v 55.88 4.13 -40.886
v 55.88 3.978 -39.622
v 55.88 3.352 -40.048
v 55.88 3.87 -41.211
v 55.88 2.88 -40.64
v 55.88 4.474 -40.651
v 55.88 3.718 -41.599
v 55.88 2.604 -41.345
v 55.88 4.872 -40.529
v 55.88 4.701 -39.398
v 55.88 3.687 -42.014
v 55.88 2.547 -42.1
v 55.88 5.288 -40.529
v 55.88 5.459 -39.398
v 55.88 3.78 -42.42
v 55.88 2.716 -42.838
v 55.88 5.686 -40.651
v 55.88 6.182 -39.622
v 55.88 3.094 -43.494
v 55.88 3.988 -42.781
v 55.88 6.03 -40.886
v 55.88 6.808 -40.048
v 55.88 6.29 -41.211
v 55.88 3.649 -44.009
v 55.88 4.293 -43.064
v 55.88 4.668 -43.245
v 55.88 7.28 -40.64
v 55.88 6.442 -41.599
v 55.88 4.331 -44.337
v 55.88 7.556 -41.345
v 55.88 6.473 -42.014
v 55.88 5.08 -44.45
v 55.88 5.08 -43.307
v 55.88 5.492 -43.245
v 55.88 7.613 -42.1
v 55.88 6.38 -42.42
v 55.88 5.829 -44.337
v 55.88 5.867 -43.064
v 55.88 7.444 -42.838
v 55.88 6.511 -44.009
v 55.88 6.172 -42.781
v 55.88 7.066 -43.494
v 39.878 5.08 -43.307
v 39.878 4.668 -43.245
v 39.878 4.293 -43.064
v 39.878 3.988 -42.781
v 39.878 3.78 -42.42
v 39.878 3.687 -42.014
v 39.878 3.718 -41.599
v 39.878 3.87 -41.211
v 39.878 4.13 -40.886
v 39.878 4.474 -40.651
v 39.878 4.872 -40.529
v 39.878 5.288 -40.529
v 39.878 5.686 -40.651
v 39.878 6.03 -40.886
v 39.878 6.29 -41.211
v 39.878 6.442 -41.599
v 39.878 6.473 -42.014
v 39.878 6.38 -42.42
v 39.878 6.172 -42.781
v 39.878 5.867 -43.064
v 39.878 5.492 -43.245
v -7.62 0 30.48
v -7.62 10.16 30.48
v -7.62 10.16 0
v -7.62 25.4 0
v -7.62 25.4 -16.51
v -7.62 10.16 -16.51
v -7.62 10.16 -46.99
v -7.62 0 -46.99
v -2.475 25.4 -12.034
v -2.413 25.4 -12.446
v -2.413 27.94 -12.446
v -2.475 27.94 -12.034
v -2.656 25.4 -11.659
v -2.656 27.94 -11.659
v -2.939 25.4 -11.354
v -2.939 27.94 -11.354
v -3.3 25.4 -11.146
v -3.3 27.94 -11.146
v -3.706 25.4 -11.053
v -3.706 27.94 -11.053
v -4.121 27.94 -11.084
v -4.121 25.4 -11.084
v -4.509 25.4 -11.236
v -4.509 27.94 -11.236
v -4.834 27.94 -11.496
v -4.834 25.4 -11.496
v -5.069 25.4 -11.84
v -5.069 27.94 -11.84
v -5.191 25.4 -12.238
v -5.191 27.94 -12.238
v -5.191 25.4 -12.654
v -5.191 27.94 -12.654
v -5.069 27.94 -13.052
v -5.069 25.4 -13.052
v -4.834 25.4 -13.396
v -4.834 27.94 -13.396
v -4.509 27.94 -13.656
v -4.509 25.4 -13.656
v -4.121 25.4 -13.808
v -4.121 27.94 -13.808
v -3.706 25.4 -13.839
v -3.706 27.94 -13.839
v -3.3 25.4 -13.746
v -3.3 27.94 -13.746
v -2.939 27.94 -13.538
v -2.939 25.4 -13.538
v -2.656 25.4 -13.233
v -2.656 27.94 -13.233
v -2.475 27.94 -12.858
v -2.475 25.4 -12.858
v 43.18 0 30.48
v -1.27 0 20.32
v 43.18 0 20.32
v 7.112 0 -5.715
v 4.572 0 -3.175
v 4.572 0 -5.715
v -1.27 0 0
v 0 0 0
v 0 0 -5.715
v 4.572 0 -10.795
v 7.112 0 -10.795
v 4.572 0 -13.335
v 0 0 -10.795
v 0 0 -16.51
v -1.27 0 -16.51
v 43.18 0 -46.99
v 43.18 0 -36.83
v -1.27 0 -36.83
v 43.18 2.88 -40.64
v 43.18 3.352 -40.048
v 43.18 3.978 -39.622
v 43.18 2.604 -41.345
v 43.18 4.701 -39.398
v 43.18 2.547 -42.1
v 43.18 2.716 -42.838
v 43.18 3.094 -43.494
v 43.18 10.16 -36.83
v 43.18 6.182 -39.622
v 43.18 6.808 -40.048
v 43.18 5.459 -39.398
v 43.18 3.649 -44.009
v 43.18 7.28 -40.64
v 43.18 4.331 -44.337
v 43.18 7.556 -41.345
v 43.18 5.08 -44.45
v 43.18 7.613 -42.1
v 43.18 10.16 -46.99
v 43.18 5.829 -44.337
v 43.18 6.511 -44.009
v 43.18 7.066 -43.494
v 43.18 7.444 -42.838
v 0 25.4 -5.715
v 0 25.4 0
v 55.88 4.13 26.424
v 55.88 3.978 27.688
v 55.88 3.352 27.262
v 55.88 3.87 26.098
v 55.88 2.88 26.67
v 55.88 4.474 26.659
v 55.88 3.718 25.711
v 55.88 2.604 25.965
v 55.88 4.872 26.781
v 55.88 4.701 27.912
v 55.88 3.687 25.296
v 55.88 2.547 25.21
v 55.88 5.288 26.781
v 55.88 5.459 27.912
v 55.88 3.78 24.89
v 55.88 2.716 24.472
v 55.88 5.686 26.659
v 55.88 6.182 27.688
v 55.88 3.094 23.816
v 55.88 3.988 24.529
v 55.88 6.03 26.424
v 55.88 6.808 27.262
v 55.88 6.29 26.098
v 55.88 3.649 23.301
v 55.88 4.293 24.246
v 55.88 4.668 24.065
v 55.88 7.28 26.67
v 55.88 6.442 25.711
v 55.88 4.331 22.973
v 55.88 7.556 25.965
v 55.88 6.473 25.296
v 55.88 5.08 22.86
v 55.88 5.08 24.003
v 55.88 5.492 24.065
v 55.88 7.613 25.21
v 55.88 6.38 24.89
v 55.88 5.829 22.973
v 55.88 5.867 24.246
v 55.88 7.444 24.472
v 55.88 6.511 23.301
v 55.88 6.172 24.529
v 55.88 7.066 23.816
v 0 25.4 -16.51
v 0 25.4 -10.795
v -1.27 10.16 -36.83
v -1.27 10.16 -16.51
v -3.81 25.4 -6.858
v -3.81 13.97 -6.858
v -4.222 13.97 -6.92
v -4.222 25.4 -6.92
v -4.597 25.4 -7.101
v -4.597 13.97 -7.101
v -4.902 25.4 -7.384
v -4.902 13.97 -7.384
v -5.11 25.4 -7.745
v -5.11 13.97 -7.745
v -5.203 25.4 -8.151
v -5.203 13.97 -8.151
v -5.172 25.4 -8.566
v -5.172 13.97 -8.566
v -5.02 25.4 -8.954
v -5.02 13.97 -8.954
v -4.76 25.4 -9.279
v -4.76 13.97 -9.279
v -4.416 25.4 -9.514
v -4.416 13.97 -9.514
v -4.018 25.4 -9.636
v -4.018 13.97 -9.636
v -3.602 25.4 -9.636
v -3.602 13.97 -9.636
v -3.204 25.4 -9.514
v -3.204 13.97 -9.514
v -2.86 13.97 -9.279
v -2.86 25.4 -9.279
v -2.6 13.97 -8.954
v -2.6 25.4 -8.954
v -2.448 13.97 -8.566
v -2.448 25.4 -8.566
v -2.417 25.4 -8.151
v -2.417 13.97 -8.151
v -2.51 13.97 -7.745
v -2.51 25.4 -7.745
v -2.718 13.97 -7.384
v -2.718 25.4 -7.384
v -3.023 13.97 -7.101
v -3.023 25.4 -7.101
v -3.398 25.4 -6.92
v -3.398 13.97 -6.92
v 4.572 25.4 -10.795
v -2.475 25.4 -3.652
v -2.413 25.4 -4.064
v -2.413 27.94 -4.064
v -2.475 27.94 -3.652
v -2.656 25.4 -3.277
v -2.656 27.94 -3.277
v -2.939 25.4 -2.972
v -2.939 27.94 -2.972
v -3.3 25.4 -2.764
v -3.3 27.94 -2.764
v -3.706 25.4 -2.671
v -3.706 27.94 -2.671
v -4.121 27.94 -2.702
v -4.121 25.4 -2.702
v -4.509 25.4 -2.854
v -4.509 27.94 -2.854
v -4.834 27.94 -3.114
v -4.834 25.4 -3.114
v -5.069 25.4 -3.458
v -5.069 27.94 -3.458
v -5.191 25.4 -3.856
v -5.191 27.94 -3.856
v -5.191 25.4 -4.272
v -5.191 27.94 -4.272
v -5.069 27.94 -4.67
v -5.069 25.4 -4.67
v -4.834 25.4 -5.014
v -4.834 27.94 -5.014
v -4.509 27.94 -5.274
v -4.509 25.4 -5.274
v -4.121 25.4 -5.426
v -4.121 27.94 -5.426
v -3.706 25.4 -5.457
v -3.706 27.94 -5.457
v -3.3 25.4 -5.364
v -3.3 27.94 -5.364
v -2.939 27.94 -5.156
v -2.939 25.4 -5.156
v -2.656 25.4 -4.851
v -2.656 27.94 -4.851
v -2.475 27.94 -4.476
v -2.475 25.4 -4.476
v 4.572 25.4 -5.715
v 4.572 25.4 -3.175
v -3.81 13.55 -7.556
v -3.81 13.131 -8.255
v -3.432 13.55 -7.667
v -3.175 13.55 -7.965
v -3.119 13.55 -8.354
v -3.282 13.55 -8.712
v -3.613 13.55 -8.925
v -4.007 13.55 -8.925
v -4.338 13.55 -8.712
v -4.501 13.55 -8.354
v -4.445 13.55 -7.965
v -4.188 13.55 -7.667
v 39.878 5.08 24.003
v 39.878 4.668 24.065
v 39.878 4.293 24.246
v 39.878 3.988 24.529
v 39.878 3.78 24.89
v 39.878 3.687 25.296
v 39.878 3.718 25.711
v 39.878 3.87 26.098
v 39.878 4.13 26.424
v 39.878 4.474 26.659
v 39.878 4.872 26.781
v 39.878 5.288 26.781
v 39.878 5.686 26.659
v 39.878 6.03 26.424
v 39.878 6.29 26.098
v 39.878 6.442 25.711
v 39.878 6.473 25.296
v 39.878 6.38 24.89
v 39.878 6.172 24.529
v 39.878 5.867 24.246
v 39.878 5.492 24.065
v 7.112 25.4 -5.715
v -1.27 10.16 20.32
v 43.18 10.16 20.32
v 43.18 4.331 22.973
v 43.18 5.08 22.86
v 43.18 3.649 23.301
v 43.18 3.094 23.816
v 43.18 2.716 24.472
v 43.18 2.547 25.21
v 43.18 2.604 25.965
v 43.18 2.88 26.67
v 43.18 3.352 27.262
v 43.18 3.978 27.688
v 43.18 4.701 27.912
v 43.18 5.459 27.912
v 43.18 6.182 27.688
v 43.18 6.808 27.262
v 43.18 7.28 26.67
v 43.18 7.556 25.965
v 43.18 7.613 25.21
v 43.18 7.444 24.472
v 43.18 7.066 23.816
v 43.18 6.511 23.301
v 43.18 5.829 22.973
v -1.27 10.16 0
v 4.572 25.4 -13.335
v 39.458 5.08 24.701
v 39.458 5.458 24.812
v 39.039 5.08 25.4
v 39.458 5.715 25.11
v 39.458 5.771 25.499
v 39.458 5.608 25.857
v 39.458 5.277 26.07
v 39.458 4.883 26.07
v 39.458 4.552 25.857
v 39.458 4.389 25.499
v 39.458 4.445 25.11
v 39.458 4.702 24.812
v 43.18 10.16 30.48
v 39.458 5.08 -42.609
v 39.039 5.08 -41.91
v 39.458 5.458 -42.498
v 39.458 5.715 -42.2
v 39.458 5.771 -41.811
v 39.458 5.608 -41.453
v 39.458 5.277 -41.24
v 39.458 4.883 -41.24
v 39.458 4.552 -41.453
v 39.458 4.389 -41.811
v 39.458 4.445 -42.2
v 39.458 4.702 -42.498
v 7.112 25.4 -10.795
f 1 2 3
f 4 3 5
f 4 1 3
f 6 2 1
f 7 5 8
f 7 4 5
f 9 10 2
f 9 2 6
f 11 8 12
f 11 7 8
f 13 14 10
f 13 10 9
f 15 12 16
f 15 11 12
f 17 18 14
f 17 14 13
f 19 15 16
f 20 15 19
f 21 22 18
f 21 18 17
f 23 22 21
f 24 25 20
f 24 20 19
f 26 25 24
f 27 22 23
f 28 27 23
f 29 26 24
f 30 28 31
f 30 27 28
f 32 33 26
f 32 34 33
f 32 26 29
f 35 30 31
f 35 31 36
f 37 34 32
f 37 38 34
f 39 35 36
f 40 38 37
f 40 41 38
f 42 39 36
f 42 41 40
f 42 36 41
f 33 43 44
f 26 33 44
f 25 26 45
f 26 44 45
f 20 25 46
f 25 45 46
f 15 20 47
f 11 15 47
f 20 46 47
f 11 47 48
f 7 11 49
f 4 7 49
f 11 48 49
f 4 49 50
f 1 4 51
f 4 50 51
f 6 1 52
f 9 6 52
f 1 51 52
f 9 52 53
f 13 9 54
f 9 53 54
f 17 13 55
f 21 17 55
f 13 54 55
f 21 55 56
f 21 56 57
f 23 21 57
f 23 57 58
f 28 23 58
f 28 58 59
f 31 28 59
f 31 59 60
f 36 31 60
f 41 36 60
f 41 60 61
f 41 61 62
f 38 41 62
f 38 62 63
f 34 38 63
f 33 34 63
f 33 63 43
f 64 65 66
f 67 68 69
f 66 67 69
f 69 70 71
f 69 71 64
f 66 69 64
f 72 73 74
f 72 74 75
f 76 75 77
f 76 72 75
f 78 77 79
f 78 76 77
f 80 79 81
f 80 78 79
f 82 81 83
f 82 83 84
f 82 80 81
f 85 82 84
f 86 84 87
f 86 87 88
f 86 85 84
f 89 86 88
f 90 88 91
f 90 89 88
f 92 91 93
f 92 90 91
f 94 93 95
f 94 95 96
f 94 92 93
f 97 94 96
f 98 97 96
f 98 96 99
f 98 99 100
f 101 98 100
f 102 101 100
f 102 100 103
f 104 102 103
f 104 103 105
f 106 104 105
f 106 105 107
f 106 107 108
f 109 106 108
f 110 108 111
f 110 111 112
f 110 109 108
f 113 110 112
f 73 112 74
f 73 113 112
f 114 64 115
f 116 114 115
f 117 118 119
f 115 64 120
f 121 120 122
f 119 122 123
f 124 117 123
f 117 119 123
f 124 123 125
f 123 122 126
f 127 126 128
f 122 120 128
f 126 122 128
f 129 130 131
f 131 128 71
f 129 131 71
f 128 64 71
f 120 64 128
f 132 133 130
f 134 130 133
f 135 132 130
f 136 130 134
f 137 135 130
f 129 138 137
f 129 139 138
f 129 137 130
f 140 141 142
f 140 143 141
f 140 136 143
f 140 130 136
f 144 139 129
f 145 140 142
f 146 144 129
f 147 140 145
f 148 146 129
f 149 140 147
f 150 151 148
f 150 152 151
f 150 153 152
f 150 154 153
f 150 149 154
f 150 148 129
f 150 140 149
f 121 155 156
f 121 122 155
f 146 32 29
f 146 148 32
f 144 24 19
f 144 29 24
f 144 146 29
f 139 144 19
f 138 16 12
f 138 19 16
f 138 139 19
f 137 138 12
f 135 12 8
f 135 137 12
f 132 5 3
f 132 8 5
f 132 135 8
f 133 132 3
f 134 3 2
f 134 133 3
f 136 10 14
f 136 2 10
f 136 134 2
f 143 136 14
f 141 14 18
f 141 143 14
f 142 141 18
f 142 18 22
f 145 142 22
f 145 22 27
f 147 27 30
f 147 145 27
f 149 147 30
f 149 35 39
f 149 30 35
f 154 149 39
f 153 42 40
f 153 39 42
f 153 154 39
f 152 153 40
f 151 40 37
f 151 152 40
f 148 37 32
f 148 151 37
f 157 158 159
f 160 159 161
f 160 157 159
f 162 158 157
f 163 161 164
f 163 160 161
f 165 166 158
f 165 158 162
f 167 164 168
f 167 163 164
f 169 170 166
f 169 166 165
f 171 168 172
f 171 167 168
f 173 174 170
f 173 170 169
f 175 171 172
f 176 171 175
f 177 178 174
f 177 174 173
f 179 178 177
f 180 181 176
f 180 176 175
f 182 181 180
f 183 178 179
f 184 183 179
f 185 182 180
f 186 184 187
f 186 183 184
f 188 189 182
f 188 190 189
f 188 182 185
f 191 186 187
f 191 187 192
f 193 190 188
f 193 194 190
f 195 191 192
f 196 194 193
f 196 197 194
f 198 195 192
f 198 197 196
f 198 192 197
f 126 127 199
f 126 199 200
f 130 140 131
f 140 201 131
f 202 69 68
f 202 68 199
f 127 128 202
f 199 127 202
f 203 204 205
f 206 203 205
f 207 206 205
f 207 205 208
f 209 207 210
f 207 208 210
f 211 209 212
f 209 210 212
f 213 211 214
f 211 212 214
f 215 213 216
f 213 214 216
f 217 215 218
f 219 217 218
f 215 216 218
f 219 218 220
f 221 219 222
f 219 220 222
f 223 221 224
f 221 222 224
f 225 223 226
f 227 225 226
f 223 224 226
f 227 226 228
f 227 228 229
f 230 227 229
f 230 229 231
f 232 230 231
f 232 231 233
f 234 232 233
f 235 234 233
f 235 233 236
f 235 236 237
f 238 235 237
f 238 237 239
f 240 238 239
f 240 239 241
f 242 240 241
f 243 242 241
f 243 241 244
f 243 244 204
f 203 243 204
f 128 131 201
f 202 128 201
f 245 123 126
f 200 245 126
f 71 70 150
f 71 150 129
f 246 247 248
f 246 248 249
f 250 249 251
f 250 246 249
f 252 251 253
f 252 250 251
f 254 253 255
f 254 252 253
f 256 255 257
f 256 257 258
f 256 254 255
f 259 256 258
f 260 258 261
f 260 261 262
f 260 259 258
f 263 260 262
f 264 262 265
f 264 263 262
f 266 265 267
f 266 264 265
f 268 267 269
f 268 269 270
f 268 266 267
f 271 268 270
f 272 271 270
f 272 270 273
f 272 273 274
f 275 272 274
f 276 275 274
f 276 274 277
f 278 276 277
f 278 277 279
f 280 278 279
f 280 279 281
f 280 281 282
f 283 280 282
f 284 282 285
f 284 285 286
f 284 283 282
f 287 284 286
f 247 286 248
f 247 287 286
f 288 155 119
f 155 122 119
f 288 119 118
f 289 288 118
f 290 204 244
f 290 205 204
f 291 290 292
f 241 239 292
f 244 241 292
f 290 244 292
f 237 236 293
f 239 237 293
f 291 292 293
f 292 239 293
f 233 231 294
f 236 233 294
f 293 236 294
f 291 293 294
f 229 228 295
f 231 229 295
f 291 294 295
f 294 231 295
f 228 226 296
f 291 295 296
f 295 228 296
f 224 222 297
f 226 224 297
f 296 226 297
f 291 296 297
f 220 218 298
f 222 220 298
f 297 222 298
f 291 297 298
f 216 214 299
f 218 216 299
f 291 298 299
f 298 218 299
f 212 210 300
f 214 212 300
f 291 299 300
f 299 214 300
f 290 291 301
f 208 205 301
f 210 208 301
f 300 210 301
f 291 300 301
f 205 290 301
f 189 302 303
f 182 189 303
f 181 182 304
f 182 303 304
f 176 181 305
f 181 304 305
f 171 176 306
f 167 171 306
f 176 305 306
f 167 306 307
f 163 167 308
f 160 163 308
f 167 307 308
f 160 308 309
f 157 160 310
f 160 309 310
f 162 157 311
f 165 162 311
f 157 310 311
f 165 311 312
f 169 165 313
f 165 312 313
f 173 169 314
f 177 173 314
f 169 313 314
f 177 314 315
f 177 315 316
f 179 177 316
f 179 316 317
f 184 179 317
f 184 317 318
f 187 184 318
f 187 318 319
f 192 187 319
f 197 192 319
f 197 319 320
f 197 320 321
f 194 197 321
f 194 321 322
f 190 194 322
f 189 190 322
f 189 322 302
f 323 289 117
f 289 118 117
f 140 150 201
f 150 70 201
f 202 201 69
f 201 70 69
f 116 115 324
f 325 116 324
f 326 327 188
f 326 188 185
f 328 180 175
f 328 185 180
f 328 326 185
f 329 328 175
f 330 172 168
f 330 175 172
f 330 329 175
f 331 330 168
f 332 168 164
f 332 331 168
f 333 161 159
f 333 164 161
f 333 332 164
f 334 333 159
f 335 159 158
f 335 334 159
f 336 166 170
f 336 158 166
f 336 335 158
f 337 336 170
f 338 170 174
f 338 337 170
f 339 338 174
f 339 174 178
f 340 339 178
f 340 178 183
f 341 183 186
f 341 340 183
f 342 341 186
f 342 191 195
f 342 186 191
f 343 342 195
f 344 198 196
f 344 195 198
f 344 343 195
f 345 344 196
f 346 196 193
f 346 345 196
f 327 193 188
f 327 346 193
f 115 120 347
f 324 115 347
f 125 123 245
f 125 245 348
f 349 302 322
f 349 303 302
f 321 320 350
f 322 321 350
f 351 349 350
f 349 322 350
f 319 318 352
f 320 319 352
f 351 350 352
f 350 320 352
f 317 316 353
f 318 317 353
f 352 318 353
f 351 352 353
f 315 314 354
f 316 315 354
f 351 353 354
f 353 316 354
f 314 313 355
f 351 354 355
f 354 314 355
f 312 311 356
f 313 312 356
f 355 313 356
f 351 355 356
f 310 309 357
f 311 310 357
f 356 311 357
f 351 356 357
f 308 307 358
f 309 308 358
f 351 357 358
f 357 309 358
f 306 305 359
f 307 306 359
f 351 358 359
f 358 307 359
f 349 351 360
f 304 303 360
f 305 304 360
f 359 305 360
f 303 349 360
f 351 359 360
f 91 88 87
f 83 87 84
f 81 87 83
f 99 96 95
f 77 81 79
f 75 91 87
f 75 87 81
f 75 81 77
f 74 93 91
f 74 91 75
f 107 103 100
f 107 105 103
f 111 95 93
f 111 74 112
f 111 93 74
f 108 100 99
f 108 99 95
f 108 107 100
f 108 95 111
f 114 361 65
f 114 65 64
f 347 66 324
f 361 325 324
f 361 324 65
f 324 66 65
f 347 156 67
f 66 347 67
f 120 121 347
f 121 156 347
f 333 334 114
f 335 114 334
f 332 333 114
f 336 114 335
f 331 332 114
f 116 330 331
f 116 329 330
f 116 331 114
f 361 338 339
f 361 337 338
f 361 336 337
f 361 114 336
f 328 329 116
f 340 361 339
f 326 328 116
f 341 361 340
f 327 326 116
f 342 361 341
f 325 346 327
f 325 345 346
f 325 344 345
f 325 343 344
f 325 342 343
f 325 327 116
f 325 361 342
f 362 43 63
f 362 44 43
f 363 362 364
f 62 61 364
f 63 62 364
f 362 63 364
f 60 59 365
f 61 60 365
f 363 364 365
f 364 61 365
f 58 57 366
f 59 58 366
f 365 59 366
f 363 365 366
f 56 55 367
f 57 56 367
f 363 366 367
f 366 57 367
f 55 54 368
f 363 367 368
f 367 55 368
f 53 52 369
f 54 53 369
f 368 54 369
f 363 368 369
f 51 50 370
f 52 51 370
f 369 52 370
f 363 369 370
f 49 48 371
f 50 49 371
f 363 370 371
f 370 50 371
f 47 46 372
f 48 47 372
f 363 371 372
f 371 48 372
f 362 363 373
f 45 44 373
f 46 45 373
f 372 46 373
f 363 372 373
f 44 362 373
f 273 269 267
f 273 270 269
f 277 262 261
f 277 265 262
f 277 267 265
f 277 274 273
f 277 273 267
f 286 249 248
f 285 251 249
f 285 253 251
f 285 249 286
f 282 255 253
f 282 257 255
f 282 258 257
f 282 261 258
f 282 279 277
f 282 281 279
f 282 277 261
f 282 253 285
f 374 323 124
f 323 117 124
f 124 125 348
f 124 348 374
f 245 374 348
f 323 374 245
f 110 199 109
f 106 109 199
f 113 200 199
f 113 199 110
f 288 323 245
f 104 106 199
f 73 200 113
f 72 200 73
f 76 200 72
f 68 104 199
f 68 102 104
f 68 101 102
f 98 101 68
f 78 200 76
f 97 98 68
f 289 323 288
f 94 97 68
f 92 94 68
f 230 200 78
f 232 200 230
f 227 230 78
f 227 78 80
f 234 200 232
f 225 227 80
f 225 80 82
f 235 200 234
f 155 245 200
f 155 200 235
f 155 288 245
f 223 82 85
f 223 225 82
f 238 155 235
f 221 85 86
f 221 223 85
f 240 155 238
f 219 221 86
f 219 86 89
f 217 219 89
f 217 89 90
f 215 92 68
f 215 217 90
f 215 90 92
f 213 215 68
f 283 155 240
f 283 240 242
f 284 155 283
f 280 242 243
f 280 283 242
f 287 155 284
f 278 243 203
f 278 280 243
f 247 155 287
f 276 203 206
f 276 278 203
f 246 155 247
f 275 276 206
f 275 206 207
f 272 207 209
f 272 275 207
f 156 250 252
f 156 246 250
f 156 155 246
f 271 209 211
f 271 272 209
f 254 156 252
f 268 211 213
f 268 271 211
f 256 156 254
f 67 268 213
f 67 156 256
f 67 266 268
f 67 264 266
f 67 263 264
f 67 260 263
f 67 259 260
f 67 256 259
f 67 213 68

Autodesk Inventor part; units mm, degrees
ref_plane "YZ Plane" through (0, 0, 0) normal (1, 0, 0) x (0, 1, 0)
ref_plane "XZ Plane" through (0, 0, 0) normal (0, 1, 0) x (-1, 0, 0)
ref_plane "XY Plane" through (0, 0, 0) normal (0, 0, 1) x (1, 0, 0)
sketch "Sketch1" plane through (0, 0, 0) normal (0, 1, 0) x (-1, 0, 0)
  line L0 (0, 0) -> (7.62, 0)
  line L1 (7.62, 0) -> (7.62, -16.51)
  line L2 (7.62, -16.51) -> (0, -16.51)
  line L3 (0, -16.51) -> (0, 0)
  line L4 (0, 0) -> (0, -5.715)
  line L5 (0, -5.715) -> (-7.112, -5.715)
  line L6 (-7.112, -5.715) -> (-7.112, -10.795)
  line L7 (-7.112, -10.795) -> (0, -10.795)
  line L8 (-7.112, -5.715) -> (-4.572, -5.715)
  line L9 (-4.572, -5.715) -> (-4.572, -3.175)
  line L10 (-4.572, -3.175) -> (-7.112, -5.715)
  line L11 (-7.112, -10.795) -> (-4.572, -10.795)
  line L12 (-4.572, -10.795) -> (-4.572, -13.335)
  line L13 (-4.572, -13.335) -> (-7.112, -10.795)
  dimension "d0" = 7.62
  dimension "d1" = 16.51
  dimension "d2" = 5.715
  dimension "d3" = 7.112
  dimension "d4" = 5.08
  dimension "d5" = 2.54
  dimension "d6" = 2.54
  dimension "d7" = 2.54
extrude "Extrusion1" add sketch "Sketch1" along normal blind 25.4
sketch "Sketch2" plane through (0, 25.4, 0) normal (0, 1, 0) x (1, 0, 0)
  line L0 (-7.62, 0) -> (0, 0) projected
  line L1 (-3.81, 0) -> (-3.81, 4.064)
  line L2 (0, 16.51) -> (-7.62, 16.51) projected
  line L3 (-3.81, 16.51) -> (-3.81, 12.446)
  circle A0 centre (-3.81, 4.064) radius 1.397
  circle A1 centre (-3.81, 12.446) radius 1.397
  dimension "d10" = 4.064
  dimension "d11" = 4.064
  dimension "d12" = 2.794
  dimension "d13" = 2.794
extrude "Extrusion2" add sketch "Sketch2" along normal blind 2.54
sketch "Sketch3" plane through (0, 25.4, 0) normal (0, 1, 0) x (1, 0, 0)
  line L0 (-7.62, 0) -> (0, 0) projected
  line L1 (-3.81, 0) -> (-3.81, 8.255)
  dimension "d16" = 8.255
hole "Hole1" at (-3.81, 25.4, -8.255) direction (0, -1, 0) diameter 2.794 depth 11.43 tip angle 118
sketch "Sketch4" plane through (0, 0, -16.51) normal (0, 0, -1) x (-1, 0, 0)
  line L0 (7.62, 0) -> (0, 0) projected
  line L1 (7.62, 0) -> (1.27, 0)
  line L2 (1.27, 0) -> (1.27, 10.16)
  line L3 (1.27, 10.16) -> (7.62, 10.16)
  line L4 (7.62, 10.16) -> (7.62, 0)
  dimension "d24" = 6.35
  dimension "d25" = 10.16
extrude "Extrusion3" add sketch "Sketch4" along normal blind 30.48
sketch "Sketch5" plane through (-1.27, 0, -16.51) normal (1, 0, 0) x (0, 0, -1)
  line L0 (30.48, 10.16) -> (30.48, 0) projected
  line L1 (-16.51, 0) -> (30.48, 0) projected
  line L2 (30.48, 10.16) -> (20.32, 10.16)
  line L3 (20.32, 10.16) -> (20.32, 0)
  line L4 (20.32, 0) -> (30.48, 0)
  line L5 (30.48, 0) -> (30.48, 10.16)
  dimension "d28" = 10.16
extrude "Extrusion4" add sketch "Sketch5" along normal blind 44.45
sketch "Sketch6" plane through (43.18, 0, -16.51) normal (1, 0, 0) x (0, 0, -1)
  line L0 (30.48, 0) -> (30.48, 10.16) projected
  line L1 (30.48, 5.08) -> (25.4, 5.08)
  circle A0 centre (25.4, 5.08) radius 2.54
  point P0 (-16.51, 0)
  dimension "d31" = 5.08
  dimension "d32" = 5.08
extrude "Extrusion5" add sketch "Sketch6" along normal blind 12.7
sketch "Sketch7" plane through (55.88, 5.08, -41.91) normal (1, 0, 0) x (0, 0, -1)
  circle A0 centre (0, 0) radius 1.397
  point P0 (-41.91, -5.08)
  dimension "d35" = 2.794
hole "Hole2" at (55.88, 5.08, -41.91) direction (-1, 0, 0) diameter 2.794 depth 16.002 tip angle 118
sketch "Sketch8" plane through (-7.62, 0, 0) normal (0, 0, 1) x (1, 0, 0)
  line L0 (0, 0) -> (6.35, 0)
  line L1 (6.35, 0) -> (6.35, 10.16)
  line L2 (6.35, 10.16) -> (0, 10.16)
  line L3 (0, 10.16) -> (0, 0)
  point P0 (7.62, 0)
  dimension "d43" = 6.35
  dimension "d44" = 10.16
extrude "Extrusion6" add sketch "Sketch8" along normal blind 30.48
sketch "Sketch9" plane through (-1.27, 0, 0) normal (1, 0, 0) x (0, 0, -1)
  line L0 (-30.48, 0) -> (46.99, 0) projected
  line L1 (0, 10.16) -> (-30.48, 10.16) projected
  line L2 (-30.48, 0) -> (-20.32, 0)
  line L3 (-20.32, 0) -> (-20.32, 10.16)
  line L4 (-20.32, 10.16) -> (-30.48, 10.16)
  line L5 (-30.48, 10.16) -> (-30.48, 0)
  point P0 (0, 0)
  dimension "d47" = 10.16
extrude "Extrusion7" add sketch "Sketch9" along normal blind 44.45
sketch "Sketch10" plane through (43.18, 0, 0) normal (1, 0, 0) x (0, 0, -1)
  line L0 (-20.32, 10.16) -> (-20.32, 0) projected
  line L1 (-20.32, 5.08) -> (-25.4, 5.08)
  circle A0 centre (-25.4, 5.08) radius 2.54
  point P0 (0, 0)
  dimension "d50" = 5.08
  dimension "d51" = 5.08
extrude "Extrusion8" add sketch "Sketch10" along normal blind 12.7
sketch "Sketch11" plane through (55.88, 5.08, 25.4) normal (1, 0, 0) x (0, 0, -1)
  circle A0 centre (0, 0) radius 1.397
  point P0 (25.4, -5.08)
  dimension "d54" = 2.794
hole "Hole3" at (55.88, 5.08, 25.4) direction (-1, 0, 0) diameter 2.794 depth 16.002 tip angle 118
properties part number "Grab Rail v2"
